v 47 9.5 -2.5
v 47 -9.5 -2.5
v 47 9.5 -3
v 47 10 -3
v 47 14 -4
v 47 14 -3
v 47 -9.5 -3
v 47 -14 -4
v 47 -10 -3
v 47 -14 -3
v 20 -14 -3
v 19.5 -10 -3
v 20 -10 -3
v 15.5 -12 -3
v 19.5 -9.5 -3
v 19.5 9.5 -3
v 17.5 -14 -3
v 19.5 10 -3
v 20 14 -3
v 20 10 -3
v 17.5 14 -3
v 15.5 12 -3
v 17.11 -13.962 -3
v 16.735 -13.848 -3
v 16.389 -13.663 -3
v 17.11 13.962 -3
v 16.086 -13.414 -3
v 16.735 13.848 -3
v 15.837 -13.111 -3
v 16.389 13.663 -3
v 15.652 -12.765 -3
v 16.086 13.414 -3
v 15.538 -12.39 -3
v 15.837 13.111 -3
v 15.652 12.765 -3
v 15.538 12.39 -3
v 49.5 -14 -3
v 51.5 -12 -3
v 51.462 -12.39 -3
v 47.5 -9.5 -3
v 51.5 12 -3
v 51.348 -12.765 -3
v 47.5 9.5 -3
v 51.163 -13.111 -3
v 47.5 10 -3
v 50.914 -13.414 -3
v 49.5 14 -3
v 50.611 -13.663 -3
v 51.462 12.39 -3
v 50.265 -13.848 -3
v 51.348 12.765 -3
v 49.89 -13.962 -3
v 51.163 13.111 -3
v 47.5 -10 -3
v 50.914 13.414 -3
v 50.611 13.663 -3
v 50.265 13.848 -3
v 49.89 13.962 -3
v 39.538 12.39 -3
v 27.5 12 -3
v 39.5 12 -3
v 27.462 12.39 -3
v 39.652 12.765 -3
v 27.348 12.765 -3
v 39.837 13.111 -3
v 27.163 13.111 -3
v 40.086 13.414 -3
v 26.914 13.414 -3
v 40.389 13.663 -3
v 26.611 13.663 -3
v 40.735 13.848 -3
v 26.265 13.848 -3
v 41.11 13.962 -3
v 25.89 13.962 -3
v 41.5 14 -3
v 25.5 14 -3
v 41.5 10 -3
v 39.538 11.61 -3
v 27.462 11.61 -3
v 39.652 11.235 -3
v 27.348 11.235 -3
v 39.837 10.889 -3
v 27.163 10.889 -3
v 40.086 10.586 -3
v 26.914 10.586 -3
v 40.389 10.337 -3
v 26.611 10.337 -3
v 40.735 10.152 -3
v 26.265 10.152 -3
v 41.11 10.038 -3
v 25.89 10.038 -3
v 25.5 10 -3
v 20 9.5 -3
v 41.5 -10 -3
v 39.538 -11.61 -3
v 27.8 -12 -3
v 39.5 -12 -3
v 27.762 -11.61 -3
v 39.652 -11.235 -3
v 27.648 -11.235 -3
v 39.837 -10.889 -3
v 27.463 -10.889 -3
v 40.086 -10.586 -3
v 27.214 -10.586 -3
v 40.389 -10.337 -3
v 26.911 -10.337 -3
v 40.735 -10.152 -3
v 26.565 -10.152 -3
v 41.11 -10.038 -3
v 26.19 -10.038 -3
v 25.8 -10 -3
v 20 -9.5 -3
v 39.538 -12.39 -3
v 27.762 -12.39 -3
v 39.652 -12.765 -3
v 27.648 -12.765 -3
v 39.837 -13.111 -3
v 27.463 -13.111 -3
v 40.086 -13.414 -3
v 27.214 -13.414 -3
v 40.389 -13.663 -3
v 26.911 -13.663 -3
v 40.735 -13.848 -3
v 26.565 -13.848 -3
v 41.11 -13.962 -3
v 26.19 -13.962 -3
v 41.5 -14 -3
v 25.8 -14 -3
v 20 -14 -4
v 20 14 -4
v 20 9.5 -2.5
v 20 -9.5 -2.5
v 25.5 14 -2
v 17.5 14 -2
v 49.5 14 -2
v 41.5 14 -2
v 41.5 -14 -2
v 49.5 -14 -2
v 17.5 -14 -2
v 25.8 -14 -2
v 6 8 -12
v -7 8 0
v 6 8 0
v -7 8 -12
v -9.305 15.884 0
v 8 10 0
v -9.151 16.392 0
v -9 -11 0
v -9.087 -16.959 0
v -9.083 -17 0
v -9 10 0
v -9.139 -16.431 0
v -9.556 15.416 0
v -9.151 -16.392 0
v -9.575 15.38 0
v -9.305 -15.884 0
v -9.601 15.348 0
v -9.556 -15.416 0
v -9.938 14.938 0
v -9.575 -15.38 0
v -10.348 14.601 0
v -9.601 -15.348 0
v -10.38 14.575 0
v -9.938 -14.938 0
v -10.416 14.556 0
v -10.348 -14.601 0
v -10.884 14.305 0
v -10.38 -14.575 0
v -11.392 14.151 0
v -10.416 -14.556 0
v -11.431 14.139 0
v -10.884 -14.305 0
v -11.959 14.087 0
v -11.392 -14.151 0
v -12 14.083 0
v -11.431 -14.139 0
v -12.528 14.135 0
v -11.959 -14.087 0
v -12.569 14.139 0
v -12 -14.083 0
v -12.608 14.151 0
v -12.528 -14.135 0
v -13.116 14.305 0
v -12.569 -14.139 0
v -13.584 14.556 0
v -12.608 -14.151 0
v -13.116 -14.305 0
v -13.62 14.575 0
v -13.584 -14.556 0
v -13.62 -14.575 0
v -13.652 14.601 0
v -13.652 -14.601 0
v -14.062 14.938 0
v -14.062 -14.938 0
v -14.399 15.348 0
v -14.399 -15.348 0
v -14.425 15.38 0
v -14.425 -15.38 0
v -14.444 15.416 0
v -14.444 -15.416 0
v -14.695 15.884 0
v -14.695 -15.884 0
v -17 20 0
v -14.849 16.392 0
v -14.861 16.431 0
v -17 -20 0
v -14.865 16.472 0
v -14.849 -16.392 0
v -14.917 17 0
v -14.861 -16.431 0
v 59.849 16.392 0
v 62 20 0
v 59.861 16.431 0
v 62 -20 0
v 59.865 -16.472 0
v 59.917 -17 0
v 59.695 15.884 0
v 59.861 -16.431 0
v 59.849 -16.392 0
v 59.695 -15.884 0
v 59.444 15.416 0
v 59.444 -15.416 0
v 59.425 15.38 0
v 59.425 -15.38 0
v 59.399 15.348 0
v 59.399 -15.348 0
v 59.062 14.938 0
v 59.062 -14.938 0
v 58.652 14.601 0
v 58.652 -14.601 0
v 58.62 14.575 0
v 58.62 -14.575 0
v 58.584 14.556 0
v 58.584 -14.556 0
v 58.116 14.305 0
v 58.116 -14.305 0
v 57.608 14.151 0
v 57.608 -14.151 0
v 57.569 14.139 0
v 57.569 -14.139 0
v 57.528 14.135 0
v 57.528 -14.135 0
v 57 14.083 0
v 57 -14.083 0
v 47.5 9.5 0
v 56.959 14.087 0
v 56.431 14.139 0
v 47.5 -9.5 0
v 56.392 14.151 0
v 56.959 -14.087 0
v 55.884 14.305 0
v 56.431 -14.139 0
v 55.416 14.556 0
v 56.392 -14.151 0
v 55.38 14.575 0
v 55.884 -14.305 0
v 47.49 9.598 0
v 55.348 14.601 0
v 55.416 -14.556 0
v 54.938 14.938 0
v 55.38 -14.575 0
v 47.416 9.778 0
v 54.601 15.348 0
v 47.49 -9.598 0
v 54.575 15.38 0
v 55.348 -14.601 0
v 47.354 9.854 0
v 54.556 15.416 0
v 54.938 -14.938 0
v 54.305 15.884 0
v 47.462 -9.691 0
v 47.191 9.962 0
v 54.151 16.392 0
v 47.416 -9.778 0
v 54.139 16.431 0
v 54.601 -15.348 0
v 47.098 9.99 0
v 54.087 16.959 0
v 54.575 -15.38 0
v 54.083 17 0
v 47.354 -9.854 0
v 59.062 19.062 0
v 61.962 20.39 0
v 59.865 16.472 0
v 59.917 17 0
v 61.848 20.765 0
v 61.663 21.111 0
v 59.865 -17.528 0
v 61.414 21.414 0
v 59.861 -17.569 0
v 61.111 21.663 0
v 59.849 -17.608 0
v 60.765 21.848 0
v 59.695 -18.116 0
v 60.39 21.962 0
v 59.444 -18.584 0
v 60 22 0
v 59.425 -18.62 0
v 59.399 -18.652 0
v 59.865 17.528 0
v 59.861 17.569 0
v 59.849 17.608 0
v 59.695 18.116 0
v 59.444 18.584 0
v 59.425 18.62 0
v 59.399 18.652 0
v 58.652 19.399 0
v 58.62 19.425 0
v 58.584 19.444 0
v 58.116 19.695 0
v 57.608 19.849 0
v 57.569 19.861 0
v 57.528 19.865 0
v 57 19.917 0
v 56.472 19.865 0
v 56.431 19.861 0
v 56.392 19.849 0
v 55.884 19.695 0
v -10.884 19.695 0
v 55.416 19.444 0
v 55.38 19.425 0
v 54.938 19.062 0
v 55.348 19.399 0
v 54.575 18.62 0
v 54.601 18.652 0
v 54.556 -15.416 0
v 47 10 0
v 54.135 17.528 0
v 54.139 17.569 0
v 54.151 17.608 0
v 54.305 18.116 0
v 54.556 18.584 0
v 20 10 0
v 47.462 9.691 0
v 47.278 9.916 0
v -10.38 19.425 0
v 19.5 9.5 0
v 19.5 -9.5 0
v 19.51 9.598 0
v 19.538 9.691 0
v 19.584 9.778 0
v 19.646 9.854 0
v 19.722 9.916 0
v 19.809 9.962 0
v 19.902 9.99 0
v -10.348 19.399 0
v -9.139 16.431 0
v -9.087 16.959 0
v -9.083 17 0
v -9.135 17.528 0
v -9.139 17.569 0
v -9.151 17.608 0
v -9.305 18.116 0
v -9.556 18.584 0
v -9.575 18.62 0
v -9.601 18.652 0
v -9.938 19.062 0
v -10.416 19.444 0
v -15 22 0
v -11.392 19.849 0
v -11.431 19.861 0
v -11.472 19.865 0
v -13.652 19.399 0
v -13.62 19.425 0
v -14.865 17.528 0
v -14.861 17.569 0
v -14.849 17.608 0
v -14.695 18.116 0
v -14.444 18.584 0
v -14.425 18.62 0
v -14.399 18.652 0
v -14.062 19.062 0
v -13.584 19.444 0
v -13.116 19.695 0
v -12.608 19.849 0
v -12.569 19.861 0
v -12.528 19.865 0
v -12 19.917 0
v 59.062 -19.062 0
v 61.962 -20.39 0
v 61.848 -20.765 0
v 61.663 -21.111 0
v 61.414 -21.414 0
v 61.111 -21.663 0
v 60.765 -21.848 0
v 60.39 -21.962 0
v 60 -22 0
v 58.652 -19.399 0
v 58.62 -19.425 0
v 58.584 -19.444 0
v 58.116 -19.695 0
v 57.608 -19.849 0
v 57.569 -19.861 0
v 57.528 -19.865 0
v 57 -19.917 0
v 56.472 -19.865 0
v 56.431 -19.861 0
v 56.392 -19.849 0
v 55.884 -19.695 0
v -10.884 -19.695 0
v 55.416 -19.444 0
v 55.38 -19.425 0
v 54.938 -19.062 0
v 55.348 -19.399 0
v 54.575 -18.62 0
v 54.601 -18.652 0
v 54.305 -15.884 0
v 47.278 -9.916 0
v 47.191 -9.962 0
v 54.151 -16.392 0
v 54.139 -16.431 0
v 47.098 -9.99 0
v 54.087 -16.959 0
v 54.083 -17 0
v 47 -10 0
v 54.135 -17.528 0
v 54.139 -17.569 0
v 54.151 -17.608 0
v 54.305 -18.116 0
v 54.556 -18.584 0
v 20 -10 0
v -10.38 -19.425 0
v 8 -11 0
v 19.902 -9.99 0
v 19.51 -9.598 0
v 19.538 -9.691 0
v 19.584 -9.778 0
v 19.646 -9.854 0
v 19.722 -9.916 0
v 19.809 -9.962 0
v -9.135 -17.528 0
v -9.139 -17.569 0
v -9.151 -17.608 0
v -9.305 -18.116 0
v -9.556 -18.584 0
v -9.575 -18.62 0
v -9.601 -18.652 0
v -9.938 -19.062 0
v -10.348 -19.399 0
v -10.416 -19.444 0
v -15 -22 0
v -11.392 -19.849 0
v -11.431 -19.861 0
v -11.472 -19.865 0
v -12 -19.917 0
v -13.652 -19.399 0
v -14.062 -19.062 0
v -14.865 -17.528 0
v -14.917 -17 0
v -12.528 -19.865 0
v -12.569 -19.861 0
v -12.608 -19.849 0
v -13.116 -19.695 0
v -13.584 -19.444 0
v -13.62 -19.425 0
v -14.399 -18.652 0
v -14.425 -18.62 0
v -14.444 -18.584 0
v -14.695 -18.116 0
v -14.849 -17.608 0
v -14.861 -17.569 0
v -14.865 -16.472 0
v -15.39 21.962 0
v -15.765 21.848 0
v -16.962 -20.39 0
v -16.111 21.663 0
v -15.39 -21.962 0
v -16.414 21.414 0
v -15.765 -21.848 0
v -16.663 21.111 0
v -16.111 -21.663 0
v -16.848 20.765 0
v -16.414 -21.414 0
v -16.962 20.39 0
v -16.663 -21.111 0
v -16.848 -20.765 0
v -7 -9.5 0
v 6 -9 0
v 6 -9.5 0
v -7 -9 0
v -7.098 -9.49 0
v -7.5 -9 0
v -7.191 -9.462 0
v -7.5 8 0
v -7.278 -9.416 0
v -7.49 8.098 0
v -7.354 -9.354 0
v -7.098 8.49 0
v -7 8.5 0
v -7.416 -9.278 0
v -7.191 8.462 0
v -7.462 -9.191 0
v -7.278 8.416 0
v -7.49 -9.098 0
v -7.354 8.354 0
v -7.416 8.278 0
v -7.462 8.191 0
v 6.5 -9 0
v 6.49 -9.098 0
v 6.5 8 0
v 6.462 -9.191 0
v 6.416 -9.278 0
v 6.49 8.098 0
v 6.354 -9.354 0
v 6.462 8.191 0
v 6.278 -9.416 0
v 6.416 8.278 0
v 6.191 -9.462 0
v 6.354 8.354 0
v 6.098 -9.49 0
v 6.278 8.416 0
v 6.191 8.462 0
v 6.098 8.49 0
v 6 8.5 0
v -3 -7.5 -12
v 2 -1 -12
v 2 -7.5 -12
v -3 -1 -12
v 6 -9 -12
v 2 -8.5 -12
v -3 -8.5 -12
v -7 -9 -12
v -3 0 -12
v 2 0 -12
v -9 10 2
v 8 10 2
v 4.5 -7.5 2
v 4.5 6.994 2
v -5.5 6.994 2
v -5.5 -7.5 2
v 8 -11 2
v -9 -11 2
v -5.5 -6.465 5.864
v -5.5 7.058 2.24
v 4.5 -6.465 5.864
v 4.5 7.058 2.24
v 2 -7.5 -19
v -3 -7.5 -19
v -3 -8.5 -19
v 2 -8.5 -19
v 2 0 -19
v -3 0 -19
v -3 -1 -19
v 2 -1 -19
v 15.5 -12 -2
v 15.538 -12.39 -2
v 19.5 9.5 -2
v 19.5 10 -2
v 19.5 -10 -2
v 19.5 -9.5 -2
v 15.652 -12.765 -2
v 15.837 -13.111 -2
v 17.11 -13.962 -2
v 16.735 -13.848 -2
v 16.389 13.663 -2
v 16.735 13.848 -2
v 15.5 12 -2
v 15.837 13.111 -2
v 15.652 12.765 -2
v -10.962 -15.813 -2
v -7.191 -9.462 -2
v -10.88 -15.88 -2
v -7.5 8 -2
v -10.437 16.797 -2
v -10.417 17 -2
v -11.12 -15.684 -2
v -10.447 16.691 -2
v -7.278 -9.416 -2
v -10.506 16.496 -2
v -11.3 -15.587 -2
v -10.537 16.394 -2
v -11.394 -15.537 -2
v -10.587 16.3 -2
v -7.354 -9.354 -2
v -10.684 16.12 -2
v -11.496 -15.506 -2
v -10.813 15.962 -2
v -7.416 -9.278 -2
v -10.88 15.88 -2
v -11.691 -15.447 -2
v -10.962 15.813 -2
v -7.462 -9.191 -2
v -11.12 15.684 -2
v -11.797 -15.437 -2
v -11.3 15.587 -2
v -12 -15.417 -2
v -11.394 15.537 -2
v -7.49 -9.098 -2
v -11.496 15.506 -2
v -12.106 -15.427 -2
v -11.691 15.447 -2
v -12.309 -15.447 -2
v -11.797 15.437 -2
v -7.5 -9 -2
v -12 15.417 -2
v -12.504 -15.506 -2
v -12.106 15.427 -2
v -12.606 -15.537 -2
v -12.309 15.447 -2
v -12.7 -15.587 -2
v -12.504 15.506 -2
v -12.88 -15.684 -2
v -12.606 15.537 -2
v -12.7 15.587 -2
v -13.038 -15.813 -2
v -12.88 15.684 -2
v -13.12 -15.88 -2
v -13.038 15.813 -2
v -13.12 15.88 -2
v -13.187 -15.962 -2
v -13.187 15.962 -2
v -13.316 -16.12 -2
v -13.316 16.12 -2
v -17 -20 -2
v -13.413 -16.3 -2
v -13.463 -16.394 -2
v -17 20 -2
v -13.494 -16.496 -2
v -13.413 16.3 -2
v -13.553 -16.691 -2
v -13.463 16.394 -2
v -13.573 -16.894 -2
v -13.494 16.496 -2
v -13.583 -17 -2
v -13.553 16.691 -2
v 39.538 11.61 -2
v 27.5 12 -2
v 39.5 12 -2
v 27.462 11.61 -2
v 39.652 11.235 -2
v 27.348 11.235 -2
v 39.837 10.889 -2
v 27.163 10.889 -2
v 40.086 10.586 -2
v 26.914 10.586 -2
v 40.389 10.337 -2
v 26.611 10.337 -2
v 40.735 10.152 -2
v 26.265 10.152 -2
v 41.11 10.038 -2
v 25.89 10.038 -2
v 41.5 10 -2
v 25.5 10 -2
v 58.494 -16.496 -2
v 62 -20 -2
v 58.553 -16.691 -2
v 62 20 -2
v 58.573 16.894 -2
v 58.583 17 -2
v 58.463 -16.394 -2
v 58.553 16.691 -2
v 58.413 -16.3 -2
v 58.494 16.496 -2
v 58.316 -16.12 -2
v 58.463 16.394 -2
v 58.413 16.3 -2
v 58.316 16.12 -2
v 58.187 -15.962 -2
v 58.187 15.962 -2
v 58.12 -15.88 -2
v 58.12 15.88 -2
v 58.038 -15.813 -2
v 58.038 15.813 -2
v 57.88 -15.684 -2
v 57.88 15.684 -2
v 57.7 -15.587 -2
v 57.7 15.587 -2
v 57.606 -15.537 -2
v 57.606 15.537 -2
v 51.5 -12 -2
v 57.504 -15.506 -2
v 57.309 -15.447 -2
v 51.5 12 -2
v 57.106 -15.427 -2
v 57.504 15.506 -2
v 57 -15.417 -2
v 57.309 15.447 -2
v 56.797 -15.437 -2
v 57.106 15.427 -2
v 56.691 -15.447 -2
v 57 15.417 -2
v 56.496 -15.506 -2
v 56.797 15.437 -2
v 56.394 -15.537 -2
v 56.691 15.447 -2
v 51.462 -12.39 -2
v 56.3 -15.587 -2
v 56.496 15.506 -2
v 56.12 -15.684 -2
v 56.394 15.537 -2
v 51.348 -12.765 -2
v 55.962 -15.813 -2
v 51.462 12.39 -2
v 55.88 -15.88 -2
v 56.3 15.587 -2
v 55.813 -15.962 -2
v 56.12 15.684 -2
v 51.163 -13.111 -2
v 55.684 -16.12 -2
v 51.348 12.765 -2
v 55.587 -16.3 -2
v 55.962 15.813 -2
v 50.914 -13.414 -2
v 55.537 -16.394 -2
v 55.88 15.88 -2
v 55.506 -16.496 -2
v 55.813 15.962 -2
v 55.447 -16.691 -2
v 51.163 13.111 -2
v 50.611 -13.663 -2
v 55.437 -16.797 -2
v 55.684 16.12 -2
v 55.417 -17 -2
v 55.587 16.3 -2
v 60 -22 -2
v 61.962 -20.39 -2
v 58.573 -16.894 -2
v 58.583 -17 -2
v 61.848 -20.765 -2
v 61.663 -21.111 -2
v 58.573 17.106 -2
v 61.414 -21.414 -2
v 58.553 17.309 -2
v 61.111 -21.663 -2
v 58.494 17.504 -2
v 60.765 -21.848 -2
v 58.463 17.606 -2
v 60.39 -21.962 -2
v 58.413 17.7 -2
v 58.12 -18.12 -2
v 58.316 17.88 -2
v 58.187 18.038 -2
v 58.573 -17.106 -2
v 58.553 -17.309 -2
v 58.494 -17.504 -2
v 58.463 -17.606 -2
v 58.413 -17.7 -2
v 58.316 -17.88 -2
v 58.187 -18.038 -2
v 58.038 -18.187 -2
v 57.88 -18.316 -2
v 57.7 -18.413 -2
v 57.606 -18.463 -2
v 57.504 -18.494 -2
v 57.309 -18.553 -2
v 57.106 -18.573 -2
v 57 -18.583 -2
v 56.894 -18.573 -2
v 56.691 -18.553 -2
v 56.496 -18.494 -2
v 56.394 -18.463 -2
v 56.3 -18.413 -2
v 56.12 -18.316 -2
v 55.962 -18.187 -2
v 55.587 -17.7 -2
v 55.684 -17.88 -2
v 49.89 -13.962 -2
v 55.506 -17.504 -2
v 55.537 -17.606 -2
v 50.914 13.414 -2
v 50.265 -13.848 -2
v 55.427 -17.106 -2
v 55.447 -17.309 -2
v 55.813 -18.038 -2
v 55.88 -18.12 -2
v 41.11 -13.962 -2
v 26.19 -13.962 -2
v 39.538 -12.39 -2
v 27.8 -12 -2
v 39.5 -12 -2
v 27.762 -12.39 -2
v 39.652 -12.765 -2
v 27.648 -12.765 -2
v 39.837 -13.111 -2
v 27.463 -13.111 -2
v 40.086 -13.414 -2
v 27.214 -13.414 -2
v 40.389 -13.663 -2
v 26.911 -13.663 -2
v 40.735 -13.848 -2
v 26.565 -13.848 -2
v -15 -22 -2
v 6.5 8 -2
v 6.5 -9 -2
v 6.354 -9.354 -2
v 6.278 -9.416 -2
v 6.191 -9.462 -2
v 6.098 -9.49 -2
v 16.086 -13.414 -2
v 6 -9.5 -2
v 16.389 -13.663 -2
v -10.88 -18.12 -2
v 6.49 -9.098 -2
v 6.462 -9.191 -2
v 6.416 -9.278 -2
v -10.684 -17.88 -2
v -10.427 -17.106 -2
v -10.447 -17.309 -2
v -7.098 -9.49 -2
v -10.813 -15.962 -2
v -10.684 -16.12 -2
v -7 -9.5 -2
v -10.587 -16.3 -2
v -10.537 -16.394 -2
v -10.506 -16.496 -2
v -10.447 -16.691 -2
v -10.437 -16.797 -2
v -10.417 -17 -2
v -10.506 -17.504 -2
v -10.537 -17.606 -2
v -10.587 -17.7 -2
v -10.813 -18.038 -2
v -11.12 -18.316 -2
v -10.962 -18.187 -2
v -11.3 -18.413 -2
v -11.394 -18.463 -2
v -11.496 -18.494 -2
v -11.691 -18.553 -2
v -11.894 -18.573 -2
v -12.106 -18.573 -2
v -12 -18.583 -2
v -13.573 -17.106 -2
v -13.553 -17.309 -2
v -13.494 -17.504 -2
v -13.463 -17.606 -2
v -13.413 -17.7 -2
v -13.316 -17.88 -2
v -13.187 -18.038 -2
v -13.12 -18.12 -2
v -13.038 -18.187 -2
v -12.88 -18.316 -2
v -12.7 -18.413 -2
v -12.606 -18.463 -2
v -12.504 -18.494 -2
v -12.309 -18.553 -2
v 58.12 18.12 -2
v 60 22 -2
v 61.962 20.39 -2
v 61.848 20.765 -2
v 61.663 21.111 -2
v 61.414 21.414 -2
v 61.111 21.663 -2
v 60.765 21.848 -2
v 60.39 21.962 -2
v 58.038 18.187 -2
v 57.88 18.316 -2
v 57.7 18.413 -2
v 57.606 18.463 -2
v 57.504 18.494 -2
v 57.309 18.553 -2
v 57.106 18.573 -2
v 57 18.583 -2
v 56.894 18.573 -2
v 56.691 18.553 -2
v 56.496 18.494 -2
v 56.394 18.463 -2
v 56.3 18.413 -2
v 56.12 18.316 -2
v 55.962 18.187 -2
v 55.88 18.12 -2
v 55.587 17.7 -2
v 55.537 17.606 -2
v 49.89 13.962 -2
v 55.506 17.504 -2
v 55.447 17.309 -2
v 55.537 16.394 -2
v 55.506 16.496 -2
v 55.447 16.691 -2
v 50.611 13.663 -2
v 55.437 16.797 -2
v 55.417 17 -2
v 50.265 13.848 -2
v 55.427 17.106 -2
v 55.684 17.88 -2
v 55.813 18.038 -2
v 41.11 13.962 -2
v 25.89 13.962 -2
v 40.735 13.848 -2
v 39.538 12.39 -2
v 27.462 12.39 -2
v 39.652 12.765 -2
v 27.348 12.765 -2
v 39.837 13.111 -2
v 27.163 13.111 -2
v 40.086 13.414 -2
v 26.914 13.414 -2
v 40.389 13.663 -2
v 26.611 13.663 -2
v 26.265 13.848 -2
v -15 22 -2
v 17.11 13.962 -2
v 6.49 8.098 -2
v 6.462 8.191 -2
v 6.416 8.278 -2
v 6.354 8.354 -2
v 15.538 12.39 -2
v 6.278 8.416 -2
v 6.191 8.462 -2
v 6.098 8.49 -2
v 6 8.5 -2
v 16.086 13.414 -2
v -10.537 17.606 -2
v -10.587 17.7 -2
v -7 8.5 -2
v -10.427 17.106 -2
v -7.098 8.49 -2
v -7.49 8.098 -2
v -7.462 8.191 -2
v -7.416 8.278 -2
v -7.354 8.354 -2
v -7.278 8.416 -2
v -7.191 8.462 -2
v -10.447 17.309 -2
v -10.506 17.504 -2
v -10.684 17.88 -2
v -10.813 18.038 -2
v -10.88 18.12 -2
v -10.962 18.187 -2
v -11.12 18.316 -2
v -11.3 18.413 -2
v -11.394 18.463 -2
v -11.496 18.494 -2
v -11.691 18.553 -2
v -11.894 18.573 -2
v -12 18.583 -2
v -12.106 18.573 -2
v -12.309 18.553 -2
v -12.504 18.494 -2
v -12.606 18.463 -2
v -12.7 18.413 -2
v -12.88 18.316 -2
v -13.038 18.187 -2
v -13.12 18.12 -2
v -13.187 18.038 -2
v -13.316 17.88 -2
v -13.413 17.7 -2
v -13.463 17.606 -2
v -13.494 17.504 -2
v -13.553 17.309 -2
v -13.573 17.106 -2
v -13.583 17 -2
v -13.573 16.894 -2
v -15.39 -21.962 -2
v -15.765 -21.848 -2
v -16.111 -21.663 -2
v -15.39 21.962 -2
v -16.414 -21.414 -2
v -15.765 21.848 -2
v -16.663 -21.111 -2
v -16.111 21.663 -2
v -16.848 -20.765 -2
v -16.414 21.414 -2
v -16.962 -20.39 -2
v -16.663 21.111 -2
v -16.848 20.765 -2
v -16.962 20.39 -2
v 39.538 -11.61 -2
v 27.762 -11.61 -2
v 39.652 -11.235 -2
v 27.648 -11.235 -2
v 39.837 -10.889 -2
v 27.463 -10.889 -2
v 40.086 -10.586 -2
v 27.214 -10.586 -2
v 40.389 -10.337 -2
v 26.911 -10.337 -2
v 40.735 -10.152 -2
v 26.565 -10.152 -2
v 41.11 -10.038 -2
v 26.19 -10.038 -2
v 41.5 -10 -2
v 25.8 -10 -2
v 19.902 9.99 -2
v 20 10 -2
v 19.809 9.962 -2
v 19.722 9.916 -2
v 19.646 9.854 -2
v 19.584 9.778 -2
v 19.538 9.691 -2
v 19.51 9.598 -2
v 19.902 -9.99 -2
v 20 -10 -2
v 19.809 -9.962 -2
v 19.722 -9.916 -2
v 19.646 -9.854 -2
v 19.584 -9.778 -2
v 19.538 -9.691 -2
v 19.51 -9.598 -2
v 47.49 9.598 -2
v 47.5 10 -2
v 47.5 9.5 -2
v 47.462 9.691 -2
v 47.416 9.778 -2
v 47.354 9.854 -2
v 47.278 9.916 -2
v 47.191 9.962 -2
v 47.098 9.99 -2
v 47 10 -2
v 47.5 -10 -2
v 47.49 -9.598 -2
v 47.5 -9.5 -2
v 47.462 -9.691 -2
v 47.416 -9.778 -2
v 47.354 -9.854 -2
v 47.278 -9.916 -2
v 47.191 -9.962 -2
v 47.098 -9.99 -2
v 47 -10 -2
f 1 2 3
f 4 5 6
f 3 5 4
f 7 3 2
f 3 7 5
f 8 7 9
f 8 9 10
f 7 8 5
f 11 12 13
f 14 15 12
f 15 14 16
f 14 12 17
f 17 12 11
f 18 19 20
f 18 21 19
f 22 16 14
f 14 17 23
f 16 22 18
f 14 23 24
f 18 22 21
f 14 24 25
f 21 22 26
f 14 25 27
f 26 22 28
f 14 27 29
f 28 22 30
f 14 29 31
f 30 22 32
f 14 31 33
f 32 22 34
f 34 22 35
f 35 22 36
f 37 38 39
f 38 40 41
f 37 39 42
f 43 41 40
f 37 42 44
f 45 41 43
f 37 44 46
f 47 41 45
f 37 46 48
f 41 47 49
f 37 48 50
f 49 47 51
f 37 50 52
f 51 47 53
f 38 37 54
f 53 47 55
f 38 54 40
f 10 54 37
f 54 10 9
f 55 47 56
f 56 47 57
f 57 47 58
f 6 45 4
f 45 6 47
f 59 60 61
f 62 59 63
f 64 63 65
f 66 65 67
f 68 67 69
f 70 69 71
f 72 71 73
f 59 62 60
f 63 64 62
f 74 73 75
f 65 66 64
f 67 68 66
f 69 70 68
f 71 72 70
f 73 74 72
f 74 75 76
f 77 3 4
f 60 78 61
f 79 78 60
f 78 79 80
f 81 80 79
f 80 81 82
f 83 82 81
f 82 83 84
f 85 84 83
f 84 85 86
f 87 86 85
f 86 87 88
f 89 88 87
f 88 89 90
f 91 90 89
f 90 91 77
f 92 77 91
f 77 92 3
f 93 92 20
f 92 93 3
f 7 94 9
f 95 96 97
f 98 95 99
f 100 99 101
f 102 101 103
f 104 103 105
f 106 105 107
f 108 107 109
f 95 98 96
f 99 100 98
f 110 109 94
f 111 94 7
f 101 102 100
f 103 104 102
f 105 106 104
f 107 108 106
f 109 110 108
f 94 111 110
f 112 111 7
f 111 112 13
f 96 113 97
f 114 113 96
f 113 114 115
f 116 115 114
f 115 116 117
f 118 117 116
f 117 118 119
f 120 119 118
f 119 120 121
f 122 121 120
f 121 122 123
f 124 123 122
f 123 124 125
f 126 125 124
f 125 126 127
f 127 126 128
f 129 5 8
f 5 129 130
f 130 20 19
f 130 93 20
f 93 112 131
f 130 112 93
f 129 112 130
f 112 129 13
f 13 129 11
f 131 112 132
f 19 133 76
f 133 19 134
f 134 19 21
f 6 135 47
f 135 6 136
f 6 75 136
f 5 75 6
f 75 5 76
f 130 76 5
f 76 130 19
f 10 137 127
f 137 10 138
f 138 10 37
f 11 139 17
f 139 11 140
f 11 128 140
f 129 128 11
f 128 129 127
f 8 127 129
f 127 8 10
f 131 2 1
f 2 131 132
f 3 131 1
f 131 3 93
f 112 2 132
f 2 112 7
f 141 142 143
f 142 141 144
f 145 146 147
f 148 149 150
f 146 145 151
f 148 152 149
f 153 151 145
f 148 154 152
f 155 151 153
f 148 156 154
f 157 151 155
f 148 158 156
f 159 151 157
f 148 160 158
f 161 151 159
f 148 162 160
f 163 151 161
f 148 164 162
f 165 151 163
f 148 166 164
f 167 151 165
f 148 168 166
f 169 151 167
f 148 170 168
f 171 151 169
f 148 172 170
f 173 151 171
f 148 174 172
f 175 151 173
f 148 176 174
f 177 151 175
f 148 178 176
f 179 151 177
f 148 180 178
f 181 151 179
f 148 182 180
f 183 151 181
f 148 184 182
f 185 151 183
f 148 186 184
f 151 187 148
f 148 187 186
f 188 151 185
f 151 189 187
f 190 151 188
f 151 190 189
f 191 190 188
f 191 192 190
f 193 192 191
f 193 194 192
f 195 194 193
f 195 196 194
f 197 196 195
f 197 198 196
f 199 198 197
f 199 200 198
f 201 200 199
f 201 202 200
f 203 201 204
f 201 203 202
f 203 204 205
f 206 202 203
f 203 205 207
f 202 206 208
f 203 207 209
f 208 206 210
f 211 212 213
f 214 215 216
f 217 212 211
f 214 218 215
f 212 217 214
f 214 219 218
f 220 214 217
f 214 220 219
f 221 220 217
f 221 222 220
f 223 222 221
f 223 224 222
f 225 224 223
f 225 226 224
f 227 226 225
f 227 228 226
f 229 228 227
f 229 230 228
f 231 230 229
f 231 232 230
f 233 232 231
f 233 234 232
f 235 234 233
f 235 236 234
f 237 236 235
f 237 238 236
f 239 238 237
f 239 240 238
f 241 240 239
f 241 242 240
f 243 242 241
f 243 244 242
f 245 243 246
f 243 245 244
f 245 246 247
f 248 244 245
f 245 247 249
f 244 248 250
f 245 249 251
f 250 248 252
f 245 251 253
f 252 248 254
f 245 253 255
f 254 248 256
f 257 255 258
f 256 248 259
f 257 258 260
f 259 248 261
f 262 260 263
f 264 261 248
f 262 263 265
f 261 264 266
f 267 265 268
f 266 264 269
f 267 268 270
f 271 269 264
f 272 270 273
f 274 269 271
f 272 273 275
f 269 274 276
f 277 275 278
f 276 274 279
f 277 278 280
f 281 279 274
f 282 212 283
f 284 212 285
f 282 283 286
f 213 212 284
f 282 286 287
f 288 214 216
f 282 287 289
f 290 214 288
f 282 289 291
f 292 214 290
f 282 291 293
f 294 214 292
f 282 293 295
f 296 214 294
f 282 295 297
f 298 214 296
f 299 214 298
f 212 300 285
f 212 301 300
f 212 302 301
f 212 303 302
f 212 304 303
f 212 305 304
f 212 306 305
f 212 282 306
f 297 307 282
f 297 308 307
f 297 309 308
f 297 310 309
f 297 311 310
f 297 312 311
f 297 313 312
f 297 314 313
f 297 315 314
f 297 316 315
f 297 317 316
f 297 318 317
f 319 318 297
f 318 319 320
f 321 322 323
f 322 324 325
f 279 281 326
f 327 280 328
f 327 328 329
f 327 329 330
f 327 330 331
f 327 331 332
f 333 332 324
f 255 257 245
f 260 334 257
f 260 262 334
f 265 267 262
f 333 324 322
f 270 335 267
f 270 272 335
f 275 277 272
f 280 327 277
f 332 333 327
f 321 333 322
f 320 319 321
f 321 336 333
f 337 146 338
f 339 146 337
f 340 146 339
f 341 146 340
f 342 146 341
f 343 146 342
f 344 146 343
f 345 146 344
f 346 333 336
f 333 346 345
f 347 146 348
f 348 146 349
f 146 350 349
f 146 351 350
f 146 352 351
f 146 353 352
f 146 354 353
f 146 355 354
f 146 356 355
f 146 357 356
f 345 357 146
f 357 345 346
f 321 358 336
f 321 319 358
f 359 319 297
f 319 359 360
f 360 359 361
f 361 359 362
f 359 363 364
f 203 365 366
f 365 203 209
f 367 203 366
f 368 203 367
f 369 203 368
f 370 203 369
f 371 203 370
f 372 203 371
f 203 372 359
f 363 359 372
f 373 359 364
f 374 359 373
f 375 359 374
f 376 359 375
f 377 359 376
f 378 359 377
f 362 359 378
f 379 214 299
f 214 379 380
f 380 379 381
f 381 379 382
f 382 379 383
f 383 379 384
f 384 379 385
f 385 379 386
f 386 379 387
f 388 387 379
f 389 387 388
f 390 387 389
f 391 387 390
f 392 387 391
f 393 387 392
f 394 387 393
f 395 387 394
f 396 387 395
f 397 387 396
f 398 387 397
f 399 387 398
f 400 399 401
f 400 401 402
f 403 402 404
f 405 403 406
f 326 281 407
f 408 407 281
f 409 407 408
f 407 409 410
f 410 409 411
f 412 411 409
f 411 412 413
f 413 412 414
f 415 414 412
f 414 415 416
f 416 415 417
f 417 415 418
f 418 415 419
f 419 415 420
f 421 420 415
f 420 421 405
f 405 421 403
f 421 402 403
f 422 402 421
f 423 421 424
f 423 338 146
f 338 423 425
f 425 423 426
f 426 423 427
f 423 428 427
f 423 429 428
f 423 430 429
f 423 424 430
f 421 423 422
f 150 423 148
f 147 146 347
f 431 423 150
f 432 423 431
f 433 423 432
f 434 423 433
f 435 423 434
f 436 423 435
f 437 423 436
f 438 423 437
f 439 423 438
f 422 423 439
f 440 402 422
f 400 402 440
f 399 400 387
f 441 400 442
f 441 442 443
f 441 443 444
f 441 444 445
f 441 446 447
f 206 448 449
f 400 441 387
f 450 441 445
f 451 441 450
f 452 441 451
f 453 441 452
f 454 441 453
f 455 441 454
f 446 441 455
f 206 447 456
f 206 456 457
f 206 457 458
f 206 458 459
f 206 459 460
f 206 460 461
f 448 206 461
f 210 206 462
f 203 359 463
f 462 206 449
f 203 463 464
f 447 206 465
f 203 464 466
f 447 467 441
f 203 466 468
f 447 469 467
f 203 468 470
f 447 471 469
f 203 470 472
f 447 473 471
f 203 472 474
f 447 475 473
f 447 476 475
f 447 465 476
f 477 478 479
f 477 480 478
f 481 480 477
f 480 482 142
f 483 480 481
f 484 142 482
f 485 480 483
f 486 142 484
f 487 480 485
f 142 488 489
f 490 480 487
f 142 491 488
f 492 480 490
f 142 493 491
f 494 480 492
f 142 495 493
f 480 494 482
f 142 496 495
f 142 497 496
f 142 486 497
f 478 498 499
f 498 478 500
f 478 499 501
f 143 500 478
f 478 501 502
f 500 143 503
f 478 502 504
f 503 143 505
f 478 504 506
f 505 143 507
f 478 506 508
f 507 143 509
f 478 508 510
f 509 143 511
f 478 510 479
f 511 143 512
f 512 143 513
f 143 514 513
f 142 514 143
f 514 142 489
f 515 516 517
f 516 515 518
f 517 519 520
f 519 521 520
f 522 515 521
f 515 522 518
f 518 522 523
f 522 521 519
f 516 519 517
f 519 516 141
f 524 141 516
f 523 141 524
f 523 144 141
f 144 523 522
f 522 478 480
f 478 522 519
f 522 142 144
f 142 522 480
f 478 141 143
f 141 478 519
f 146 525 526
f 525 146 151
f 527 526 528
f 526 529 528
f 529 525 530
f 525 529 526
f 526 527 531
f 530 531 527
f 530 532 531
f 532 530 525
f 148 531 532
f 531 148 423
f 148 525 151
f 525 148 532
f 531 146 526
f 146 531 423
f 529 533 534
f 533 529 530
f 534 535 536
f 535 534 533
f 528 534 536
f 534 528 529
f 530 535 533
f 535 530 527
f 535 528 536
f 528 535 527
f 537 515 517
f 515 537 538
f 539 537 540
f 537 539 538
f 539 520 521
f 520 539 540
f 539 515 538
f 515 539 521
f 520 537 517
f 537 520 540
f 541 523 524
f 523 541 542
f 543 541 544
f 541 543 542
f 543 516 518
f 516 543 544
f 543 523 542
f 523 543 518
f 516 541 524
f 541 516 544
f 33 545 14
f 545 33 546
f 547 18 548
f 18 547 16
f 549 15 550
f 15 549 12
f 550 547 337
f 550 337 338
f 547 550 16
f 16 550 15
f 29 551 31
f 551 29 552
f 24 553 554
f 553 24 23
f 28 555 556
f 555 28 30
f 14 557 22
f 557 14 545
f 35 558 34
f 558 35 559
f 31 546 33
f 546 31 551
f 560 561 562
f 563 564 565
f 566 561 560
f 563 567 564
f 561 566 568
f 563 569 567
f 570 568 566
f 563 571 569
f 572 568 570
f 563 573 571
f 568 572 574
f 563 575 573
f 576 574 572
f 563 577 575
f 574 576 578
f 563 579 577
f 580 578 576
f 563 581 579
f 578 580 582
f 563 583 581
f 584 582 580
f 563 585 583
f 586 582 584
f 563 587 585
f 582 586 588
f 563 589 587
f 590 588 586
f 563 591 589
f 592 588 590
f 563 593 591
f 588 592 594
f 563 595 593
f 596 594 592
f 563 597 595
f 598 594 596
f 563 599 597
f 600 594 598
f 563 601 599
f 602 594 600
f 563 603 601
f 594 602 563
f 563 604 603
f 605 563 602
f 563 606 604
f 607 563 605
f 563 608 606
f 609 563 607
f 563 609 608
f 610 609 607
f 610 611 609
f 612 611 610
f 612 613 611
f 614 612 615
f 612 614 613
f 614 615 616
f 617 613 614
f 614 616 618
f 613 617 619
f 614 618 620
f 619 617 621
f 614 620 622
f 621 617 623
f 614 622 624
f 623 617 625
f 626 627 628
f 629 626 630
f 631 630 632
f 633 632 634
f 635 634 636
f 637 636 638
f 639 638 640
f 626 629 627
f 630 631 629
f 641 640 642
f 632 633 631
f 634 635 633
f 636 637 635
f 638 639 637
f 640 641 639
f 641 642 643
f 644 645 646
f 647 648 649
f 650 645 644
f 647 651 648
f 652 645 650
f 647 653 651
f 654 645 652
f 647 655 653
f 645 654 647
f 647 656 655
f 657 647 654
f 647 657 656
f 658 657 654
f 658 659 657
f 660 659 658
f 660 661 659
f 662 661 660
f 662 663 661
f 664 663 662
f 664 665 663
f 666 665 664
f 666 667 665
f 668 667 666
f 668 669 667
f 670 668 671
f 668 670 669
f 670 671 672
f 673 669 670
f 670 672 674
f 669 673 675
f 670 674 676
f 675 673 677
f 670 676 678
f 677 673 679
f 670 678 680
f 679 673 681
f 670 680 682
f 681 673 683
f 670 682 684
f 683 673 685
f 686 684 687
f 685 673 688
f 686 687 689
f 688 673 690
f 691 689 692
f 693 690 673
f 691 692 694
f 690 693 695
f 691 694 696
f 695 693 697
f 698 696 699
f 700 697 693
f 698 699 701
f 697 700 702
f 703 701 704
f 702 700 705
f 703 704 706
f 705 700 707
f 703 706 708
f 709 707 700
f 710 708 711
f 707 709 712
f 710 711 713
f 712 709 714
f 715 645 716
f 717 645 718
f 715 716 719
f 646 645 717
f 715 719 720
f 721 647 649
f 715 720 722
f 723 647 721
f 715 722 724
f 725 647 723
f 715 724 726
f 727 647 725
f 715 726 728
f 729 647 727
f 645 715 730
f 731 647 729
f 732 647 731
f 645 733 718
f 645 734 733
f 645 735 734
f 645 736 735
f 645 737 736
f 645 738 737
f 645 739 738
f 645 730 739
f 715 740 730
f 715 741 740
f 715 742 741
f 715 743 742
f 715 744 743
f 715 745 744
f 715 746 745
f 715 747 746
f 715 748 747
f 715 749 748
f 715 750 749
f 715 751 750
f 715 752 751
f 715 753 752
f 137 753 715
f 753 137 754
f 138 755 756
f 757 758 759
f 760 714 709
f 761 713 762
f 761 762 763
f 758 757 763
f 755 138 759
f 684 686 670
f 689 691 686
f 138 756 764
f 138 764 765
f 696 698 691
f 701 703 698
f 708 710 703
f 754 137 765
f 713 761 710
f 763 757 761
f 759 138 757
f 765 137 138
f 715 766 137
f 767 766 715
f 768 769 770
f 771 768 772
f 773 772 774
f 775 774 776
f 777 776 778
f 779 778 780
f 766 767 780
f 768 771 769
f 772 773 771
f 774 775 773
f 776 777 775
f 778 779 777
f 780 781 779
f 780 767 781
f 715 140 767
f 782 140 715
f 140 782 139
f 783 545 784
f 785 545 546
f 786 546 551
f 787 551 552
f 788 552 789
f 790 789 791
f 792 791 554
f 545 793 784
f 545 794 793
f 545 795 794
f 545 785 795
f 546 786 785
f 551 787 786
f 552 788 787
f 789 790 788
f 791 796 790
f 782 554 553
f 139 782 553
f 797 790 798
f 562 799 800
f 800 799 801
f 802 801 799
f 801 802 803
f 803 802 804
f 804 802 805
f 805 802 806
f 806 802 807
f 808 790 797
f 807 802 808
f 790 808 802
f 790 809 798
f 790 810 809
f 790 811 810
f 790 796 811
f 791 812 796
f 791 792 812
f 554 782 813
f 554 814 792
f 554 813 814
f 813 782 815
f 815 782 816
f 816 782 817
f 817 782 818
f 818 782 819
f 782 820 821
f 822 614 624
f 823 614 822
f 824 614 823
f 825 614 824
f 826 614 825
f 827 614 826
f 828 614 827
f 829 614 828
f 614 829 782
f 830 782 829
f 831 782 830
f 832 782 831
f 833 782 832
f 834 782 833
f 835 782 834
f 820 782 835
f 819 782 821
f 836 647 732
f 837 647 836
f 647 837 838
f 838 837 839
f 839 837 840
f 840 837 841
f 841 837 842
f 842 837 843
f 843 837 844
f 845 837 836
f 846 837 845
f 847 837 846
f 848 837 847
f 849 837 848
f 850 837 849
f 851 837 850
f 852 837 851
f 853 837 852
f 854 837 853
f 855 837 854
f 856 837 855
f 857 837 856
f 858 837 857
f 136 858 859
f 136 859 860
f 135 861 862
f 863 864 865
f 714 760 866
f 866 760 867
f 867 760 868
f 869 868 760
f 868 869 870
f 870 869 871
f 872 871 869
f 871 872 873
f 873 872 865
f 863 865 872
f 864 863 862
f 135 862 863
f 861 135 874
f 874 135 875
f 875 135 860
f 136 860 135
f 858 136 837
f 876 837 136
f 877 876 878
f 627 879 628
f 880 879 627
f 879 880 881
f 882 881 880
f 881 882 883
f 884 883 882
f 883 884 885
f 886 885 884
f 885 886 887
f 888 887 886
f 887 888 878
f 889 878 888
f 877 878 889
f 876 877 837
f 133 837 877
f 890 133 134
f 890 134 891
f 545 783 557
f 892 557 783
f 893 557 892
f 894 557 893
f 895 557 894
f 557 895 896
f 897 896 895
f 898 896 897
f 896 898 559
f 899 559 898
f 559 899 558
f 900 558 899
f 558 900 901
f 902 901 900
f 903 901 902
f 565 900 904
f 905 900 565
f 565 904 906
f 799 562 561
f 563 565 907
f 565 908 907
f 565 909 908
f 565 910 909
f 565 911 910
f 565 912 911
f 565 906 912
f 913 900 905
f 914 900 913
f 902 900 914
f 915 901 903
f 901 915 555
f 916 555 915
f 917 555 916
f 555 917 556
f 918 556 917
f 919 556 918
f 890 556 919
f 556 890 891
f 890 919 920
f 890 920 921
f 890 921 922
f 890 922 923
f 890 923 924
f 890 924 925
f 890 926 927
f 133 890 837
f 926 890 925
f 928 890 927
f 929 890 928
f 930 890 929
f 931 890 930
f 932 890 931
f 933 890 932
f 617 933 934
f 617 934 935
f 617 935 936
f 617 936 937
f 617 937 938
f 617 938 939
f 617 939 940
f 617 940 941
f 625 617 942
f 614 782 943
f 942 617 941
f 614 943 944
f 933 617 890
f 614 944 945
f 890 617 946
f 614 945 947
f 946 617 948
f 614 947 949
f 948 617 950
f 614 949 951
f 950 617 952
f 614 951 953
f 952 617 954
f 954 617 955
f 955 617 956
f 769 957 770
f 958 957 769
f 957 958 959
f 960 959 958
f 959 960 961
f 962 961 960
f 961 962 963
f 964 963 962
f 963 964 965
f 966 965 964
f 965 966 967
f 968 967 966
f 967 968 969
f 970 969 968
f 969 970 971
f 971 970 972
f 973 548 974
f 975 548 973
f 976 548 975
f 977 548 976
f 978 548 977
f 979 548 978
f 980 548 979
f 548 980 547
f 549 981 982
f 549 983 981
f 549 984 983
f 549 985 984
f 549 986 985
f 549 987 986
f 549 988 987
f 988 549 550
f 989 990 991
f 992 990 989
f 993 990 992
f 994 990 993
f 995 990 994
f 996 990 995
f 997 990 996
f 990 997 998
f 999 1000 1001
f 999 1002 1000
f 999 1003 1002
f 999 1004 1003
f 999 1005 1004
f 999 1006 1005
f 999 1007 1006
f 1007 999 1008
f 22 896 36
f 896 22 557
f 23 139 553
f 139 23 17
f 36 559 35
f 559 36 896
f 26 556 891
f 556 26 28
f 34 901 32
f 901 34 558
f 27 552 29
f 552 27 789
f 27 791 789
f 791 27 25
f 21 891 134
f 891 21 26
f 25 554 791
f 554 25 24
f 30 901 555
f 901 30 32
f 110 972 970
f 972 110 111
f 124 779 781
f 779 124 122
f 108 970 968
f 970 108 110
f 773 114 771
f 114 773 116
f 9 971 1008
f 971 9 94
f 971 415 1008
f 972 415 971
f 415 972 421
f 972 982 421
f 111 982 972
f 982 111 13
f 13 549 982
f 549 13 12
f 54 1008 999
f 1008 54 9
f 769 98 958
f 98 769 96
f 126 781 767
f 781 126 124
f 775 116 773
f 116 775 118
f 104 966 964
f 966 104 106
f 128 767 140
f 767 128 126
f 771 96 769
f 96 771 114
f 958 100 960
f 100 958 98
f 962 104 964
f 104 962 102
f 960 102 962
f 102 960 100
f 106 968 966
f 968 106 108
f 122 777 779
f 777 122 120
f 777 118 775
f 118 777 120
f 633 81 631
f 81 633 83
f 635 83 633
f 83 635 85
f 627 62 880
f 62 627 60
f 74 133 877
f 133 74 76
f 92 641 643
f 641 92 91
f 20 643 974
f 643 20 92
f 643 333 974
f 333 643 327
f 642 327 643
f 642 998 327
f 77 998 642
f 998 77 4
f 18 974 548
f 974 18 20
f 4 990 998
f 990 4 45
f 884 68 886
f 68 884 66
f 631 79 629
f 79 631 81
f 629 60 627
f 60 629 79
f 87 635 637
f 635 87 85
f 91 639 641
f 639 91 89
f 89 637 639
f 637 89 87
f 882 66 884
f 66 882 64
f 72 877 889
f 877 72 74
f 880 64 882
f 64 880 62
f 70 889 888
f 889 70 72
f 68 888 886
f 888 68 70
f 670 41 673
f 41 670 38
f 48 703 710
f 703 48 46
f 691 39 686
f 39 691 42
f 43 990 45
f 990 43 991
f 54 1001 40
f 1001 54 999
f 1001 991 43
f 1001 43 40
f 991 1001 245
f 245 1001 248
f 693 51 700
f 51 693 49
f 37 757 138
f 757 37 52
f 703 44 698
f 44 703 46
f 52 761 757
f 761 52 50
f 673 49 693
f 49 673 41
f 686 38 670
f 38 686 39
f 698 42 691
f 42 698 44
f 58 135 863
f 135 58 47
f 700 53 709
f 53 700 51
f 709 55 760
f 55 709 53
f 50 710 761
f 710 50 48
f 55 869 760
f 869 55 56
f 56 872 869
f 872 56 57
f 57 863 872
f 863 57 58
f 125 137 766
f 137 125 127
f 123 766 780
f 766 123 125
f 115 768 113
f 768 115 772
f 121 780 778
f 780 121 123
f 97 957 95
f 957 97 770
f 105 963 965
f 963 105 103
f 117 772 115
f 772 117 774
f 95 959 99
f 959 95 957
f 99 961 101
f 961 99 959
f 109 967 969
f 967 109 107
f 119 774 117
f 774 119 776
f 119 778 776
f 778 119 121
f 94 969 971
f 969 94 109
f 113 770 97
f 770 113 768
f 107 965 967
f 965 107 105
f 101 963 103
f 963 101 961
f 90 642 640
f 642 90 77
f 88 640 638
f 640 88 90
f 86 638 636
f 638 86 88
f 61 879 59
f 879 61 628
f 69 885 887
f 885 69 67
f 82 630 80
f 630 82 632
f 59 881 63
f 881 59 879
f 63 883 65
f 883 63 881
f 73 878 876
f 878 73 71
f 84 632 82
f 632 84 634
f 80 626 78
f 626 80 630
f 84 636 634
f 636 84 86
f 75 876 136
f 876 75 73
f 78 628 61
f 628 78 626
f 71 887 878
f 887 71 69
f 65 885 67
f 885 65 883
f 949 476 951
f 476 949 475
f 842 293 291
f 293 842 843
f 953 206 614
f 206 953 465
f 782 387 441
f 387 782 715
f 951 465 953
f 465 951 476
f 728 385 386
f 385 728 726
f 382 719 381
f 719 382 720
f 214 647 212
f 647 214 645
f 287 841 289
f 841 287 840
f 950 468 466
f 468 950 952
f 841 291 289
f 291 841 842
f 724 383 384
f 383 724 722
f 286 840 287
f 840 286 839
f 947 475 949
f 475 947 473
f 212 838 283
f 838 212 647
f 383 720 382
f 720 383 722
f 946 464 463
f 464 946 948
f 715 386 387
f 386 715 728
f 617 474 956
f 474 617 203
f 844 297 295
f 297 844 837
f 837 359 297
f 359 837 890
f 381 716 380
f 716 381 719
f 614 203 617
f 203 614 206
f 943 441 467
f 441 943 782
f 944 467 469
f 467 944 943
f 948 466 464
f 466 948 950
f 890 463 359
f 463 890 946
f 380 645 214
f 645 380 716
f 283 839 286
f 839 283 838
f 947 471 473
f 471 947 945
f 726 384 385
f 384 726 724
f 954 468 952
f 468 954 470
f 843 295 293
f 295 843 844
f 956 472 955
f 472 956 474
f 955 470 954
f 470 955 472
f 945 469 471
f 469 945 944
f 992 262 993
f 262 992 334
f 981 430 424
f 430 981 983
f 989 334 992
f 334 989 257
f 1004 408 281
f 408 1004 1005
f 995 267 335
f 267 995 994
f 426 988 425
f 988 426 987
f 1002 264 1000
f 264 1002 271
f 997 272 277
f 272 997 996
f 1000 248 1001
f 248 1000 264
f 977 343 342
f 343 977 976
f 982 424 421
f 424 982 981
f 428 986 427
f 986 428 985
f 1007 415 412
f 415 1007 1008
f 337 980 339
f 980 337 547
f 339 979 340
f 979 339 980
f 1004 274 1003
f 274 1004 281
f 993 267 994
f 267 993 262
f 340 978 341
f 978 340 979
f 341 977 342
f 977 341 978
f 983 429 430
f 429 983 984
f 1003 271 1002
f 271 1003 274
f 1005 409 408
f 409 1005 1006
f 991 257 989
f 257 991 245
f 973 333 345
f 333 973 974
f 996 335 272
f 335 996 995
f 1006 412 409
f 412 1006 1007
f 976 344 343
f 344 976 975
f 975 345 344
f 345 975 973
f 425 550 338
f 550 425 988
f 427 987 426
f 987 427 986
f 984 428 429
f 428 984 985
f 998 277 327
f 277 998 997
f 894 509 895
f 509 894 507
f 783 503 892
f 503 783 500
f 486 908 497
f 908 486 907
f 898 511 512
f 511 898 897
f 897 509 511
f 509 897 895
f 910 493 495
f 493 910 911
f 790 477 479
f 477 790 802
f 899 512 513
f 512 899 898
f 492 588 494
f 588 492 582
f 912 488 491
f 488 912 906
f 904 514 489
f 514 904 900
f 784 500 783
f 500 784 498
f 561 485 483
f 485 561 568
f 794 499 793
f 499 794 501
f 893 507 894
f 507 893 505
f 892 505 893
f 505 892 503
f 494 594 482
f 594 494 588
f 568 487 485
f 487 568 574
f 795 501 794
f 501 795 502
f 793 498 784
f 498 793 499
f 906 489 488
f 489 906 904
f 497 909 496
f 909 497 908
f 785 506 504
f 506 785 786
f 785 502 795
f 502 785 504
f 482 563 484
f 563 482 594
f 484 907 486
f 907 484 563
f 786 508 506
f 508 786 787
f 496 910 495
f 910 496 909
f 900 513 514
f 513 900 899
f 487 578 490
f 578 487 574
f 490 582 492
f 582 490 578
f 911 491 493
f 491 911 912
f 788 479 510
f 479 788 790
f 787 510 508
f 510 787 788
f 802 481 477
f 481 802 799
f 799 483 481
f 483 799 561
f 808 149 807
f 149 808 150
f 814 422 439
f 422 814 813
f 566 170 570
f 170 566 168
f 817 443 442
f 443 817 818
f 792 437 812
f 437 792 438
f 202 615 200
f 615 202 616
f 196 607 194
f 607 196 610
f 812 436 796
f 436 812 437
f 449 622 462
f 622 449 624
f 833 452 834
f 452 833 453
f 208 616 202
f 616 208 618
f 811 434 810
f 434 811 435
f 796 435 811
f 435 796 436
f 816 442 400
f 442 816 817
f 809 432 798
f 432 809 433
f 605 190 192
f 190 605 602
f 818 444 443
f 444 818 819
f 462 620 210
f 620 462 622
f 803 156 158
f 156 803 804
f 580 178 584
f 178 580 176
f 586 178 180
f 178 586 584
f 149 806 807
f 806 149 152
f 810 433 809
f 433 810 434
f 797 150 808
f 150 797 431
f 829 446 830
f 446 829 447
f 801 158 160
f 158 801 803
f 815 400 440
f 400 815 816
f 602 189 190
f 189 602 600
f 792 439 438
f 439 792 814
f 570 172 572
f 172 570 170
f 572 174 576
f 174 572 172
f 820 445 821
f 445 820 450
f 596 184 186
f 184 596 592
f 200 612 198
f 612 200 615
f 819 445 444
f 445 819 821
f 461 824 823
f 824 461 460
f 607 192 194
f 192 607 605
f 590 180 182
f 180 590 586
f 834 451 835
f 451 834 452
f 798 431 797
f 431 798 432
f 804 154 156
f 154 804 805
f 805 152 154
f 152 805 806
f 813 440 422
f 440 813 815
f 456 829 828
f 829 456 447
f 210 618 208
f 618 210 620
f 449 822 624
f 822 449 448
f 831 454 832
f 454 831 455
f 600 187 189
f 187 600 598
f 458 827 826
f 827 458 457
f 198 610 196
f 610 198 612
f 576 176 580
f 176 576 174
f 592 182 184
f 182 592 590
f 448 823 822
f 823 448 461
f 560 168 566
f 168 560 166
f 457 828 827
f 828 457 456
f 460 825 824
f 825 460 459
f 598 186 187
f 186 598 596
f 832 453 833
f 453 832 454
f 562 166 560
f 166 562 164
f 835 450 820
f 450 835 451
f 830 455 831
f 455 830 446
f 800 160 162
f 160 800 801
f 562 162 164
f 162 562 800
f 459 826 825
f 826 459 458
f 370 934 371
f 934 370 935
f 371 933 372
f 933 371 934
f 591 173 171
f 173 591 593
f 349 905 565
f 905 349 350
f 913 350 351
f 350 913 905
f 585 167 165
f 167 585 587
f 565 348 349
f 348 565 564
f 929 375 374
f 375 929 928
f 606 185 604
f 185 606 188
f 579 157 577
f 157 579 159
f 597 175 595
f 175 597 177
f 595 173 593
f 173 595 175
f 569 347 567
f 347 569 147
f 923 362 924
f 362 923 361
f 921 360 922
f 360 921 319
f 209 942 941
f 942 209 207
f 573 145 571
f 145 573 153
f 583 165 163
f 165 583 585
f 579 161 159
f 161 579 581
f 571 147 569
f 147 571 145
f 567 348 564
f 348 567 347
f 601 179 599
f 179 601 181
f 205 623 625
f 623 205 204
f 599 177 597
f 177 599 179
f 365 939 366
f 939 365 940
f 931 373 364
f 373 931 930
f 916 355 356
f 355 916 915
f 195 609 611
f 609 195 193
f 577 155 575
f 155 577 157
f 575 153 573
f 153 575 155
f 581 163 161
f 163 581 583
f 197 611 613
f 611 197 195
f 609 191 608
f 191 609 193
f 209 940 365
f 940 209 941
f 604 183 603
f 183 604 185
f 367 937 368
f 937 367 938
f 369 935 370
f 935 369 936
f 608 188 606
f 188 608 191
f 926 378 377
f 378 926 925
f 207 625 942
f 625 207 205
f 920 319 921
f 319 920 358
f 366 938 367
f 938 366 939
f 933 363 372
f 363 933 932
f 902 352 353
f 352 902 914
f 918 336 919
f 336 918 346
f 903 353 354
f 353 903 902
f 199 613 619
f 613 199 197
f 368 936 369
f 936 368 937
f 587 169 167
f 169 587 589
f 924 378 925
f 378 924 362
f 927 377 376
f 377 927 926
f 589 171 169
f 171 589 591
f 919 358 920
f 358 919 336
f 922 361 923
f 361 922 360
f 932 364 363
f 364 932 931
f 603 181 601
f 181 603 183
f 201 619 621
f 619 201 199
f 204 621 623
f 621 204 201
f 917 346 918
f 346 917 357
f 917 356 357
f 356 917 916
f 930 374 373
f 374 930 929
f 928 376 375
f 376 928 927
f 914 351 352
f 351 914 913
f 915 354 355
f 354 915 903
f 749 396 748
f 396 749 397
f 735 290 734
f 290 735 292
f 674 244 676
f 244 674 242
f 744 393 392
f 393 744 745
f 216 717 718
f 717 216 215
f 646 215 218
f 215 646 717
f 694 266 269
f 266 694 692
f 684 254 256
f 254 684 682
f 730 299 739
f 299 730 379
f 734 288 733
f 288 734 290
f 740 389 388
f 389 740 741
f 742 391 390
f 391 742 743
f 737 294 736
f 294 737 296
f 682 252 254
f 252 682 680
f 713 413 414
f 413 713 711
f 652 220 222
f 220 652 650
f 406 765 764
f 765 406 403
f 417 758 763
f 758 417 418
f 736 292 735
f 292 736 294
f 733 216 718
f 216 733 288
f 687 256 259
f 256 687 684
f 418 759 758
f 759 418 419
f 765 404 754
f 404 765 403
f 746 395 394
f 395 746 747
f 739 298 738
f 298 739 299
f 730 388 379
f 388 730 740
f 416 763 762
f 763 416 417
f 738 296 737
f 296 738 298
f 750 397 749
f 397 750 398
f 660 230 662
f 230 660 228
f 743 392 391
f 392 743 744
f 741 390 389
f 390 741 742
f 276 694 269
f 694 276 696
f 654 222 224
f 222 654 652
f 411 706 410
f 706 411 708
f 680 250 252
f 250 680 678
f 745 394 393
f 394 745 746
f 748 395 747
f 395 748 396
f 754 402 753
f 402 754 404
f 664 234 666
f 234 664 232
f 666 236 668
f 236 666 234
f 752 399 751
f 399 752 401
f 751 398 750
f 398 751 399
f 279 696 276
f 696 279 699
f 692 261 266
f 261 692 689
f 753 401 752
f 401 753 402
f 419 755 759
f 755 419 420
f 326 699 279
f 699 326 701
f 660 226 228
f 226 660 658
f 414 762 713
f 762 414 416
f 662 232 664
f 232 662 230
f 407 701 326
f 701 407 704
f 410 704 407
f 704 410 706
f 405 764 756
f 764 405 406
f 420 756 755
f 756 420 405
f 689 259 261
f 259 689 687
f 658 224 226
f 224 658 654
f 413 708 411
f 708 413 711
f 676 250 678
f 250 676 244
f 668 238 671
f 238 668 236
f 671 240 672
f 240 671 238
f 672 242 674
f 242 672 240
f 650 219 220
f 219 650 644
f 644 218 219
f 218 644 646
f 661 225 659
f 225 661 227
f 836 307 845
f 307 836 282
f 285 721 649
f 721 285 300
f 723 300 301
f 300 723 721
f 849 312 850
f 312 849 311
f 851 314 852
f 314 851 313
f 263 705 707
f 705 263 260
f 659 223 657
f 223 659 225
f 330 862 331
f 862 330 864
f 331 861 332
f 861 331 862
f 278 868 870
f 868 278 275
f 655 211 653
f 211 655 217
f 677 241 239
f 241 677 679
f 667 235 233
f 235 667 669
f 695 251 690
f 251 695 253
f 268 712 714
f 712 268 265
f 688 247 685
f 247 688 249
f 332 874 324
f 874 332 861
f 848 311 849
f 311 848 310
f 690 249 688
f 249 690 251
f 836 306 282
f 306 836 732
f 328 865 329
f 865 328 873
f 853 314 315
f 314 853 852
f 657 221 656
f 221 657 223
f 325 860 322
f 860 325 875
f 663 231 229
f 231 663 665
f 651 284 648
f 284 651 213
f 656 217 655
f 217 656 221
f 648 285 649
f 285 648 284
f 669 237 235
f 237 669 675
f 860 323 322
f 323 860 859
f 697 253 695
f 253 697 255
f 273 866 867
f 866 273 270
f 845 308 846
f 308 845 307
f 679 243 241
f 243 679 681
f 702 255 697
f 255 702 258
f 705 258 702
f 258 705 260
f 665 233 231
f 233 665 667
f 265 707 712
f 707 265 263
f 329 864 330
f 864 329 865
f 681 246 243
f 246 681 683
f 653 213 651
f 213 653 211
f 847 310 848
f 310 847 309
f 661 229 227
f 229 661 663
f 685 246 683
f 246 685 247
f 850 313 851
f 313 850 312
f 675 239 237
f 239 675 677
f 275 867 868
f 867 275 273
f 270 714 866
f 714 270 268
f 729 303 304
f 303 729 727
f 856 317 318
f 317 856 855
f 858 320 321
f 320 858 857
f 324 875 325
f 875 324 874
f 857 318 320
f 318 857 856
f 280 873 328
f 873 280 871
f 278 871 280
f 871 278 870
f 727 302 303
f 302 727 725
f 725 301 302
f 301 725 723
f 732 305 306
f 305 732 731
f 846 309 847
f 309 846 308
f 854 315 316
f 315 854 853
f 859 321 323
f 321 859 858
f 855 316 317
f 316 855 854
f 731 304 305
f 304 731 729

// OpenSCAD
// file: parts.scad
/**
 * Martin Egli
 * 2021-12-04
 * parts for vibra alarm 2
 */

module battery() {
    color("Silver")
    translate([0, 0, 0])
    cube([40, 22, 9]);
    color("Yellow")
    translate([40, 0, 0])
    cube([6, 22, 5]);
}

module chargerPCB() {
    color("Silver")
    translate([-2, (19-8)/2, 1])
    cube([6, 8, 3]);
    color("Blue")
    translate([0, 0, 0])
    cube([25, 19, 2]);
}

module arduinoMicroProPCB() {
    color("Silver")
    for(n = [0:1:5]) {
        translate([-13, 1+2.54/2+n*2.54, 1.75])
        cube([14, 1, 1]);
    }
    color("Black")
    translate([-1, 1, 1])
    cube([2.5, 16, 2.5]);
    color("Black")
    translate([15, 9.5, 1])
    rotate([0, 0, -45])
    cube([8, 8, 2]);
    color("Blue")
    translate([0, 0, 0])
    cube([34, 19, 2]);
}

module displayPCB() {
    color("Blue")
    translate([0, 0, 0])
    cube([27, 28, 1]);
    color("White")
    translate([0, 4.5, 0])
    cube([27, 19, 1.5]);
}

module displayPCB2_25x27(loc_res = 32) {
    difference() {
        union() {
            color("Gray") // Black
            translate([0, 0, 0])
            cube([25, 27, 1]);
            color("White")
            translate([0, 5, 0])
            cube([25, 17, 1.5]);
            
            color("Silver") {
                translate([8.5, 27-1.7, -0.1])
                cylinder(d = 2, h = 1.2, $fn = loc_res);
                translate([8.5+1*2.54, 27-1.7, -0.1])
                cylinder(d = 2, h = 1.2, $fn = loc_res);
                translate([8.5+2*2.54, 27-1.7, -0.1])
                cylinder(d = 2, h = 1.2, $fn = loc_res);
                translate([8.5+3*2.54, 27-1.7, -0.1])
                cylinder(d = 2, h = 1.2, $fn = loc_res);
            }
        }
        // m3 holes
        translate([2, 2, -1])
        cylinder(d = 3, h = 4, $fn = loc_res);
        translate([25-2, 2, -1])
        cylinder(d = 3, h = 4, $fn = loc_res);
        translate([2, 27-2, -1])
        cylinder(d = 3, h = 4, $fn = loc_res);
        translate([25-2, 27-2, -1])
        cylinder(d = 3, h = 4, $fn = loc_res);
    }
}

module switch() {
    color("Gray")
    translate([0, 0, 0])
    cube([17, 13, 12]);
    color("Gray")
    translate([-2, -2, 12])
    cube([17+4, 13+4, 2]);
    color("Red")
    translate([1.5, 1.5, 14])
    rotate([0, 15, 0])
    cube([14, 10, 4]);
    color("Silver")
    translate([0.5, (13-5)/2,-7])
    cube([1, 5, 7]);
    color("Silver")
    translate([17/2-0.5, (13-5)/2,-7])
    cube([1, 5, 7]);
}

module vibraMotor() {
    color("Silver")
    cylinder(d = 10, h = 3, $fn = 32);
}

displayPCB2_25x27();
// main file
/**
 * Martin Egli
 * 2022-11-28
 * main part for hot wire game: housing display, arduino and sound
 */

use <parts.scad>


module case1(show = 1, loc_res = 32) {
    disp_x = 20;
    disp_wid = 27;
    if(show) {
        translate([disp_x, -28/2, -4])
        displayPCB();
        translate([6, -18/2, -12])
        rotate([0, 0, 90])
        switch();
    }
    difference() {
        union() {
            hull() {
                translate([-15, -20, -2])
                cylinder(d = 4, h = 2, $fn = loc_res);
                translate([-15, +20, -2])
                cylinder(d = 4, h = 2, $fn = loc_res);
                translate([60, -20, -2])
                cylinder(d = 4, h = 2, $fn = loc_res);
                translate([60, +20, -2])
                cylinder(d = 4, h = 2, $fn = loc_res);
            }
            translate([0, 0, -3]) {
                hull() {
                    translate([disp_x-4/2-0.5, -28/2+2, 0])
                    cylinder(d = 4, h = 1, $fn = loc_res);
                    translate([disp_x-4/2-0.5, +28/2-2, 0])
                    cylinder(d = 4, h = 1, $fn = loc_res);
                }
                hull() {
                    translate([disp_x-4/2-0.5, -28/2+2, 0])
                    cylinder(d = 4, h = 1, $fn = loc_res);
                    translate([disp_x-4/2-0.2+8, -28/2+2, 0])
                    cylinder(d = 4, h = 1, $fn = loc_res);
                }
                hull() {
                    translate([disp_x-4/2-0.5, +28/2-2, 0])
                    cylinder(d = 4, h = 1, $fn = loc_res);
                    translate([disp_x-4/2-0.5+8, +28/2-2, 0])
                    cylinder(d = 4, h = 1, $fn = loc_res);
                }
                hull() {
                    translate([disp_x+disp_wid+4/2+0.5, -28/2+2, 0])
                    cylinder(d = 4, h = 1, $fn = loc_res);
                    translate([disp_x+disp_wid+4/2+0.5, +28/2-2, 0])
                    cylinder(d = 4, h = 1, $fn = loc_res);
                }
                hull() {
                    translate([disp_x+disp_wid+4/2+0.5, -28/2+2, 0])
                    cylinder(d = 4, h = 1, $fn = loc_res);
                    translate([disp_x+disp_wid+4/2+0.5-8, -28/2+2, 0])
                    cylinder(d = 4, h = 1, $fn = loc_res);
                }
                hull() {
                    translate([disp_x+disp_wid+4/2+0.5, +28/2-2, 0])
                    cylinder(d = 4, h = 1, $fn = loc_res);
                    translate([disp_x+disp_wid+4/2+0.5-8, +28/2-2, 0])
                    cylinder(d = 4, h = 1, $fn = loc_res);
                }
            }
        }
        // display cut out
        hull() {
            translate([disp_x, -28/2+4.5, -5])
            cylinder(d = 1, h = 10, $fn = loc_res);
            translate([disp_x, +28/2-4.5, -5])
            cylinder(d = 1, h = 10, $fn = loc_res);
            translate([disp_x+disp_wid, -28/2+4.5, -5])
            cylinder(d = 1, h = 10, $fn = loc_res);
            translate([disp_x+disp_wid, +28/2-4.5, -5])
            cylinder(d = 1, h = 10, $fn = loc_res);
        }
        // switch cut out
        //translate([6, -18/2, -12])
        hull() {
            translate([-6-1, -18/2, -5])
            cylinder(d = 1, h = 10, $fn = loc_res);
            translate([-6-1, +18/2-1, -5])
            cylinder(d = 1, h = 10, $fn = loc_res);
            translate([+6, -18/2, -5])
            cylinder(d = 1, h = 10, $fn = loc_res);
            translate([+6, +18/2-1, -5])
            cylinder(d = 1, h = 10, $fn = loc_res);
        }
        // m3 holes for senkkopf holz schraube
        translate([-15+3, -20+3, -2.5])
        cylinder(d2 = 6.5, d1 = 2.5, h = 3, $fn = loc_res);
        translate([-15+3, +20-3, -2.5])
        cylinder(d2 = 6.5, d1 = 2.5, h = 3, $fn = loc_res);
        translate([60-3, -20+3, -2.5])
        cylinder(d2 = 6.5, d1 = 2.5, h = 3, $fn = loc_res);
        translate([60-3, +20-3, -2.5])
        cylinder(d2 = 6.5, d1 = 2.5, h = 3, $fn = loc_res);
    }
}

case1(1);
